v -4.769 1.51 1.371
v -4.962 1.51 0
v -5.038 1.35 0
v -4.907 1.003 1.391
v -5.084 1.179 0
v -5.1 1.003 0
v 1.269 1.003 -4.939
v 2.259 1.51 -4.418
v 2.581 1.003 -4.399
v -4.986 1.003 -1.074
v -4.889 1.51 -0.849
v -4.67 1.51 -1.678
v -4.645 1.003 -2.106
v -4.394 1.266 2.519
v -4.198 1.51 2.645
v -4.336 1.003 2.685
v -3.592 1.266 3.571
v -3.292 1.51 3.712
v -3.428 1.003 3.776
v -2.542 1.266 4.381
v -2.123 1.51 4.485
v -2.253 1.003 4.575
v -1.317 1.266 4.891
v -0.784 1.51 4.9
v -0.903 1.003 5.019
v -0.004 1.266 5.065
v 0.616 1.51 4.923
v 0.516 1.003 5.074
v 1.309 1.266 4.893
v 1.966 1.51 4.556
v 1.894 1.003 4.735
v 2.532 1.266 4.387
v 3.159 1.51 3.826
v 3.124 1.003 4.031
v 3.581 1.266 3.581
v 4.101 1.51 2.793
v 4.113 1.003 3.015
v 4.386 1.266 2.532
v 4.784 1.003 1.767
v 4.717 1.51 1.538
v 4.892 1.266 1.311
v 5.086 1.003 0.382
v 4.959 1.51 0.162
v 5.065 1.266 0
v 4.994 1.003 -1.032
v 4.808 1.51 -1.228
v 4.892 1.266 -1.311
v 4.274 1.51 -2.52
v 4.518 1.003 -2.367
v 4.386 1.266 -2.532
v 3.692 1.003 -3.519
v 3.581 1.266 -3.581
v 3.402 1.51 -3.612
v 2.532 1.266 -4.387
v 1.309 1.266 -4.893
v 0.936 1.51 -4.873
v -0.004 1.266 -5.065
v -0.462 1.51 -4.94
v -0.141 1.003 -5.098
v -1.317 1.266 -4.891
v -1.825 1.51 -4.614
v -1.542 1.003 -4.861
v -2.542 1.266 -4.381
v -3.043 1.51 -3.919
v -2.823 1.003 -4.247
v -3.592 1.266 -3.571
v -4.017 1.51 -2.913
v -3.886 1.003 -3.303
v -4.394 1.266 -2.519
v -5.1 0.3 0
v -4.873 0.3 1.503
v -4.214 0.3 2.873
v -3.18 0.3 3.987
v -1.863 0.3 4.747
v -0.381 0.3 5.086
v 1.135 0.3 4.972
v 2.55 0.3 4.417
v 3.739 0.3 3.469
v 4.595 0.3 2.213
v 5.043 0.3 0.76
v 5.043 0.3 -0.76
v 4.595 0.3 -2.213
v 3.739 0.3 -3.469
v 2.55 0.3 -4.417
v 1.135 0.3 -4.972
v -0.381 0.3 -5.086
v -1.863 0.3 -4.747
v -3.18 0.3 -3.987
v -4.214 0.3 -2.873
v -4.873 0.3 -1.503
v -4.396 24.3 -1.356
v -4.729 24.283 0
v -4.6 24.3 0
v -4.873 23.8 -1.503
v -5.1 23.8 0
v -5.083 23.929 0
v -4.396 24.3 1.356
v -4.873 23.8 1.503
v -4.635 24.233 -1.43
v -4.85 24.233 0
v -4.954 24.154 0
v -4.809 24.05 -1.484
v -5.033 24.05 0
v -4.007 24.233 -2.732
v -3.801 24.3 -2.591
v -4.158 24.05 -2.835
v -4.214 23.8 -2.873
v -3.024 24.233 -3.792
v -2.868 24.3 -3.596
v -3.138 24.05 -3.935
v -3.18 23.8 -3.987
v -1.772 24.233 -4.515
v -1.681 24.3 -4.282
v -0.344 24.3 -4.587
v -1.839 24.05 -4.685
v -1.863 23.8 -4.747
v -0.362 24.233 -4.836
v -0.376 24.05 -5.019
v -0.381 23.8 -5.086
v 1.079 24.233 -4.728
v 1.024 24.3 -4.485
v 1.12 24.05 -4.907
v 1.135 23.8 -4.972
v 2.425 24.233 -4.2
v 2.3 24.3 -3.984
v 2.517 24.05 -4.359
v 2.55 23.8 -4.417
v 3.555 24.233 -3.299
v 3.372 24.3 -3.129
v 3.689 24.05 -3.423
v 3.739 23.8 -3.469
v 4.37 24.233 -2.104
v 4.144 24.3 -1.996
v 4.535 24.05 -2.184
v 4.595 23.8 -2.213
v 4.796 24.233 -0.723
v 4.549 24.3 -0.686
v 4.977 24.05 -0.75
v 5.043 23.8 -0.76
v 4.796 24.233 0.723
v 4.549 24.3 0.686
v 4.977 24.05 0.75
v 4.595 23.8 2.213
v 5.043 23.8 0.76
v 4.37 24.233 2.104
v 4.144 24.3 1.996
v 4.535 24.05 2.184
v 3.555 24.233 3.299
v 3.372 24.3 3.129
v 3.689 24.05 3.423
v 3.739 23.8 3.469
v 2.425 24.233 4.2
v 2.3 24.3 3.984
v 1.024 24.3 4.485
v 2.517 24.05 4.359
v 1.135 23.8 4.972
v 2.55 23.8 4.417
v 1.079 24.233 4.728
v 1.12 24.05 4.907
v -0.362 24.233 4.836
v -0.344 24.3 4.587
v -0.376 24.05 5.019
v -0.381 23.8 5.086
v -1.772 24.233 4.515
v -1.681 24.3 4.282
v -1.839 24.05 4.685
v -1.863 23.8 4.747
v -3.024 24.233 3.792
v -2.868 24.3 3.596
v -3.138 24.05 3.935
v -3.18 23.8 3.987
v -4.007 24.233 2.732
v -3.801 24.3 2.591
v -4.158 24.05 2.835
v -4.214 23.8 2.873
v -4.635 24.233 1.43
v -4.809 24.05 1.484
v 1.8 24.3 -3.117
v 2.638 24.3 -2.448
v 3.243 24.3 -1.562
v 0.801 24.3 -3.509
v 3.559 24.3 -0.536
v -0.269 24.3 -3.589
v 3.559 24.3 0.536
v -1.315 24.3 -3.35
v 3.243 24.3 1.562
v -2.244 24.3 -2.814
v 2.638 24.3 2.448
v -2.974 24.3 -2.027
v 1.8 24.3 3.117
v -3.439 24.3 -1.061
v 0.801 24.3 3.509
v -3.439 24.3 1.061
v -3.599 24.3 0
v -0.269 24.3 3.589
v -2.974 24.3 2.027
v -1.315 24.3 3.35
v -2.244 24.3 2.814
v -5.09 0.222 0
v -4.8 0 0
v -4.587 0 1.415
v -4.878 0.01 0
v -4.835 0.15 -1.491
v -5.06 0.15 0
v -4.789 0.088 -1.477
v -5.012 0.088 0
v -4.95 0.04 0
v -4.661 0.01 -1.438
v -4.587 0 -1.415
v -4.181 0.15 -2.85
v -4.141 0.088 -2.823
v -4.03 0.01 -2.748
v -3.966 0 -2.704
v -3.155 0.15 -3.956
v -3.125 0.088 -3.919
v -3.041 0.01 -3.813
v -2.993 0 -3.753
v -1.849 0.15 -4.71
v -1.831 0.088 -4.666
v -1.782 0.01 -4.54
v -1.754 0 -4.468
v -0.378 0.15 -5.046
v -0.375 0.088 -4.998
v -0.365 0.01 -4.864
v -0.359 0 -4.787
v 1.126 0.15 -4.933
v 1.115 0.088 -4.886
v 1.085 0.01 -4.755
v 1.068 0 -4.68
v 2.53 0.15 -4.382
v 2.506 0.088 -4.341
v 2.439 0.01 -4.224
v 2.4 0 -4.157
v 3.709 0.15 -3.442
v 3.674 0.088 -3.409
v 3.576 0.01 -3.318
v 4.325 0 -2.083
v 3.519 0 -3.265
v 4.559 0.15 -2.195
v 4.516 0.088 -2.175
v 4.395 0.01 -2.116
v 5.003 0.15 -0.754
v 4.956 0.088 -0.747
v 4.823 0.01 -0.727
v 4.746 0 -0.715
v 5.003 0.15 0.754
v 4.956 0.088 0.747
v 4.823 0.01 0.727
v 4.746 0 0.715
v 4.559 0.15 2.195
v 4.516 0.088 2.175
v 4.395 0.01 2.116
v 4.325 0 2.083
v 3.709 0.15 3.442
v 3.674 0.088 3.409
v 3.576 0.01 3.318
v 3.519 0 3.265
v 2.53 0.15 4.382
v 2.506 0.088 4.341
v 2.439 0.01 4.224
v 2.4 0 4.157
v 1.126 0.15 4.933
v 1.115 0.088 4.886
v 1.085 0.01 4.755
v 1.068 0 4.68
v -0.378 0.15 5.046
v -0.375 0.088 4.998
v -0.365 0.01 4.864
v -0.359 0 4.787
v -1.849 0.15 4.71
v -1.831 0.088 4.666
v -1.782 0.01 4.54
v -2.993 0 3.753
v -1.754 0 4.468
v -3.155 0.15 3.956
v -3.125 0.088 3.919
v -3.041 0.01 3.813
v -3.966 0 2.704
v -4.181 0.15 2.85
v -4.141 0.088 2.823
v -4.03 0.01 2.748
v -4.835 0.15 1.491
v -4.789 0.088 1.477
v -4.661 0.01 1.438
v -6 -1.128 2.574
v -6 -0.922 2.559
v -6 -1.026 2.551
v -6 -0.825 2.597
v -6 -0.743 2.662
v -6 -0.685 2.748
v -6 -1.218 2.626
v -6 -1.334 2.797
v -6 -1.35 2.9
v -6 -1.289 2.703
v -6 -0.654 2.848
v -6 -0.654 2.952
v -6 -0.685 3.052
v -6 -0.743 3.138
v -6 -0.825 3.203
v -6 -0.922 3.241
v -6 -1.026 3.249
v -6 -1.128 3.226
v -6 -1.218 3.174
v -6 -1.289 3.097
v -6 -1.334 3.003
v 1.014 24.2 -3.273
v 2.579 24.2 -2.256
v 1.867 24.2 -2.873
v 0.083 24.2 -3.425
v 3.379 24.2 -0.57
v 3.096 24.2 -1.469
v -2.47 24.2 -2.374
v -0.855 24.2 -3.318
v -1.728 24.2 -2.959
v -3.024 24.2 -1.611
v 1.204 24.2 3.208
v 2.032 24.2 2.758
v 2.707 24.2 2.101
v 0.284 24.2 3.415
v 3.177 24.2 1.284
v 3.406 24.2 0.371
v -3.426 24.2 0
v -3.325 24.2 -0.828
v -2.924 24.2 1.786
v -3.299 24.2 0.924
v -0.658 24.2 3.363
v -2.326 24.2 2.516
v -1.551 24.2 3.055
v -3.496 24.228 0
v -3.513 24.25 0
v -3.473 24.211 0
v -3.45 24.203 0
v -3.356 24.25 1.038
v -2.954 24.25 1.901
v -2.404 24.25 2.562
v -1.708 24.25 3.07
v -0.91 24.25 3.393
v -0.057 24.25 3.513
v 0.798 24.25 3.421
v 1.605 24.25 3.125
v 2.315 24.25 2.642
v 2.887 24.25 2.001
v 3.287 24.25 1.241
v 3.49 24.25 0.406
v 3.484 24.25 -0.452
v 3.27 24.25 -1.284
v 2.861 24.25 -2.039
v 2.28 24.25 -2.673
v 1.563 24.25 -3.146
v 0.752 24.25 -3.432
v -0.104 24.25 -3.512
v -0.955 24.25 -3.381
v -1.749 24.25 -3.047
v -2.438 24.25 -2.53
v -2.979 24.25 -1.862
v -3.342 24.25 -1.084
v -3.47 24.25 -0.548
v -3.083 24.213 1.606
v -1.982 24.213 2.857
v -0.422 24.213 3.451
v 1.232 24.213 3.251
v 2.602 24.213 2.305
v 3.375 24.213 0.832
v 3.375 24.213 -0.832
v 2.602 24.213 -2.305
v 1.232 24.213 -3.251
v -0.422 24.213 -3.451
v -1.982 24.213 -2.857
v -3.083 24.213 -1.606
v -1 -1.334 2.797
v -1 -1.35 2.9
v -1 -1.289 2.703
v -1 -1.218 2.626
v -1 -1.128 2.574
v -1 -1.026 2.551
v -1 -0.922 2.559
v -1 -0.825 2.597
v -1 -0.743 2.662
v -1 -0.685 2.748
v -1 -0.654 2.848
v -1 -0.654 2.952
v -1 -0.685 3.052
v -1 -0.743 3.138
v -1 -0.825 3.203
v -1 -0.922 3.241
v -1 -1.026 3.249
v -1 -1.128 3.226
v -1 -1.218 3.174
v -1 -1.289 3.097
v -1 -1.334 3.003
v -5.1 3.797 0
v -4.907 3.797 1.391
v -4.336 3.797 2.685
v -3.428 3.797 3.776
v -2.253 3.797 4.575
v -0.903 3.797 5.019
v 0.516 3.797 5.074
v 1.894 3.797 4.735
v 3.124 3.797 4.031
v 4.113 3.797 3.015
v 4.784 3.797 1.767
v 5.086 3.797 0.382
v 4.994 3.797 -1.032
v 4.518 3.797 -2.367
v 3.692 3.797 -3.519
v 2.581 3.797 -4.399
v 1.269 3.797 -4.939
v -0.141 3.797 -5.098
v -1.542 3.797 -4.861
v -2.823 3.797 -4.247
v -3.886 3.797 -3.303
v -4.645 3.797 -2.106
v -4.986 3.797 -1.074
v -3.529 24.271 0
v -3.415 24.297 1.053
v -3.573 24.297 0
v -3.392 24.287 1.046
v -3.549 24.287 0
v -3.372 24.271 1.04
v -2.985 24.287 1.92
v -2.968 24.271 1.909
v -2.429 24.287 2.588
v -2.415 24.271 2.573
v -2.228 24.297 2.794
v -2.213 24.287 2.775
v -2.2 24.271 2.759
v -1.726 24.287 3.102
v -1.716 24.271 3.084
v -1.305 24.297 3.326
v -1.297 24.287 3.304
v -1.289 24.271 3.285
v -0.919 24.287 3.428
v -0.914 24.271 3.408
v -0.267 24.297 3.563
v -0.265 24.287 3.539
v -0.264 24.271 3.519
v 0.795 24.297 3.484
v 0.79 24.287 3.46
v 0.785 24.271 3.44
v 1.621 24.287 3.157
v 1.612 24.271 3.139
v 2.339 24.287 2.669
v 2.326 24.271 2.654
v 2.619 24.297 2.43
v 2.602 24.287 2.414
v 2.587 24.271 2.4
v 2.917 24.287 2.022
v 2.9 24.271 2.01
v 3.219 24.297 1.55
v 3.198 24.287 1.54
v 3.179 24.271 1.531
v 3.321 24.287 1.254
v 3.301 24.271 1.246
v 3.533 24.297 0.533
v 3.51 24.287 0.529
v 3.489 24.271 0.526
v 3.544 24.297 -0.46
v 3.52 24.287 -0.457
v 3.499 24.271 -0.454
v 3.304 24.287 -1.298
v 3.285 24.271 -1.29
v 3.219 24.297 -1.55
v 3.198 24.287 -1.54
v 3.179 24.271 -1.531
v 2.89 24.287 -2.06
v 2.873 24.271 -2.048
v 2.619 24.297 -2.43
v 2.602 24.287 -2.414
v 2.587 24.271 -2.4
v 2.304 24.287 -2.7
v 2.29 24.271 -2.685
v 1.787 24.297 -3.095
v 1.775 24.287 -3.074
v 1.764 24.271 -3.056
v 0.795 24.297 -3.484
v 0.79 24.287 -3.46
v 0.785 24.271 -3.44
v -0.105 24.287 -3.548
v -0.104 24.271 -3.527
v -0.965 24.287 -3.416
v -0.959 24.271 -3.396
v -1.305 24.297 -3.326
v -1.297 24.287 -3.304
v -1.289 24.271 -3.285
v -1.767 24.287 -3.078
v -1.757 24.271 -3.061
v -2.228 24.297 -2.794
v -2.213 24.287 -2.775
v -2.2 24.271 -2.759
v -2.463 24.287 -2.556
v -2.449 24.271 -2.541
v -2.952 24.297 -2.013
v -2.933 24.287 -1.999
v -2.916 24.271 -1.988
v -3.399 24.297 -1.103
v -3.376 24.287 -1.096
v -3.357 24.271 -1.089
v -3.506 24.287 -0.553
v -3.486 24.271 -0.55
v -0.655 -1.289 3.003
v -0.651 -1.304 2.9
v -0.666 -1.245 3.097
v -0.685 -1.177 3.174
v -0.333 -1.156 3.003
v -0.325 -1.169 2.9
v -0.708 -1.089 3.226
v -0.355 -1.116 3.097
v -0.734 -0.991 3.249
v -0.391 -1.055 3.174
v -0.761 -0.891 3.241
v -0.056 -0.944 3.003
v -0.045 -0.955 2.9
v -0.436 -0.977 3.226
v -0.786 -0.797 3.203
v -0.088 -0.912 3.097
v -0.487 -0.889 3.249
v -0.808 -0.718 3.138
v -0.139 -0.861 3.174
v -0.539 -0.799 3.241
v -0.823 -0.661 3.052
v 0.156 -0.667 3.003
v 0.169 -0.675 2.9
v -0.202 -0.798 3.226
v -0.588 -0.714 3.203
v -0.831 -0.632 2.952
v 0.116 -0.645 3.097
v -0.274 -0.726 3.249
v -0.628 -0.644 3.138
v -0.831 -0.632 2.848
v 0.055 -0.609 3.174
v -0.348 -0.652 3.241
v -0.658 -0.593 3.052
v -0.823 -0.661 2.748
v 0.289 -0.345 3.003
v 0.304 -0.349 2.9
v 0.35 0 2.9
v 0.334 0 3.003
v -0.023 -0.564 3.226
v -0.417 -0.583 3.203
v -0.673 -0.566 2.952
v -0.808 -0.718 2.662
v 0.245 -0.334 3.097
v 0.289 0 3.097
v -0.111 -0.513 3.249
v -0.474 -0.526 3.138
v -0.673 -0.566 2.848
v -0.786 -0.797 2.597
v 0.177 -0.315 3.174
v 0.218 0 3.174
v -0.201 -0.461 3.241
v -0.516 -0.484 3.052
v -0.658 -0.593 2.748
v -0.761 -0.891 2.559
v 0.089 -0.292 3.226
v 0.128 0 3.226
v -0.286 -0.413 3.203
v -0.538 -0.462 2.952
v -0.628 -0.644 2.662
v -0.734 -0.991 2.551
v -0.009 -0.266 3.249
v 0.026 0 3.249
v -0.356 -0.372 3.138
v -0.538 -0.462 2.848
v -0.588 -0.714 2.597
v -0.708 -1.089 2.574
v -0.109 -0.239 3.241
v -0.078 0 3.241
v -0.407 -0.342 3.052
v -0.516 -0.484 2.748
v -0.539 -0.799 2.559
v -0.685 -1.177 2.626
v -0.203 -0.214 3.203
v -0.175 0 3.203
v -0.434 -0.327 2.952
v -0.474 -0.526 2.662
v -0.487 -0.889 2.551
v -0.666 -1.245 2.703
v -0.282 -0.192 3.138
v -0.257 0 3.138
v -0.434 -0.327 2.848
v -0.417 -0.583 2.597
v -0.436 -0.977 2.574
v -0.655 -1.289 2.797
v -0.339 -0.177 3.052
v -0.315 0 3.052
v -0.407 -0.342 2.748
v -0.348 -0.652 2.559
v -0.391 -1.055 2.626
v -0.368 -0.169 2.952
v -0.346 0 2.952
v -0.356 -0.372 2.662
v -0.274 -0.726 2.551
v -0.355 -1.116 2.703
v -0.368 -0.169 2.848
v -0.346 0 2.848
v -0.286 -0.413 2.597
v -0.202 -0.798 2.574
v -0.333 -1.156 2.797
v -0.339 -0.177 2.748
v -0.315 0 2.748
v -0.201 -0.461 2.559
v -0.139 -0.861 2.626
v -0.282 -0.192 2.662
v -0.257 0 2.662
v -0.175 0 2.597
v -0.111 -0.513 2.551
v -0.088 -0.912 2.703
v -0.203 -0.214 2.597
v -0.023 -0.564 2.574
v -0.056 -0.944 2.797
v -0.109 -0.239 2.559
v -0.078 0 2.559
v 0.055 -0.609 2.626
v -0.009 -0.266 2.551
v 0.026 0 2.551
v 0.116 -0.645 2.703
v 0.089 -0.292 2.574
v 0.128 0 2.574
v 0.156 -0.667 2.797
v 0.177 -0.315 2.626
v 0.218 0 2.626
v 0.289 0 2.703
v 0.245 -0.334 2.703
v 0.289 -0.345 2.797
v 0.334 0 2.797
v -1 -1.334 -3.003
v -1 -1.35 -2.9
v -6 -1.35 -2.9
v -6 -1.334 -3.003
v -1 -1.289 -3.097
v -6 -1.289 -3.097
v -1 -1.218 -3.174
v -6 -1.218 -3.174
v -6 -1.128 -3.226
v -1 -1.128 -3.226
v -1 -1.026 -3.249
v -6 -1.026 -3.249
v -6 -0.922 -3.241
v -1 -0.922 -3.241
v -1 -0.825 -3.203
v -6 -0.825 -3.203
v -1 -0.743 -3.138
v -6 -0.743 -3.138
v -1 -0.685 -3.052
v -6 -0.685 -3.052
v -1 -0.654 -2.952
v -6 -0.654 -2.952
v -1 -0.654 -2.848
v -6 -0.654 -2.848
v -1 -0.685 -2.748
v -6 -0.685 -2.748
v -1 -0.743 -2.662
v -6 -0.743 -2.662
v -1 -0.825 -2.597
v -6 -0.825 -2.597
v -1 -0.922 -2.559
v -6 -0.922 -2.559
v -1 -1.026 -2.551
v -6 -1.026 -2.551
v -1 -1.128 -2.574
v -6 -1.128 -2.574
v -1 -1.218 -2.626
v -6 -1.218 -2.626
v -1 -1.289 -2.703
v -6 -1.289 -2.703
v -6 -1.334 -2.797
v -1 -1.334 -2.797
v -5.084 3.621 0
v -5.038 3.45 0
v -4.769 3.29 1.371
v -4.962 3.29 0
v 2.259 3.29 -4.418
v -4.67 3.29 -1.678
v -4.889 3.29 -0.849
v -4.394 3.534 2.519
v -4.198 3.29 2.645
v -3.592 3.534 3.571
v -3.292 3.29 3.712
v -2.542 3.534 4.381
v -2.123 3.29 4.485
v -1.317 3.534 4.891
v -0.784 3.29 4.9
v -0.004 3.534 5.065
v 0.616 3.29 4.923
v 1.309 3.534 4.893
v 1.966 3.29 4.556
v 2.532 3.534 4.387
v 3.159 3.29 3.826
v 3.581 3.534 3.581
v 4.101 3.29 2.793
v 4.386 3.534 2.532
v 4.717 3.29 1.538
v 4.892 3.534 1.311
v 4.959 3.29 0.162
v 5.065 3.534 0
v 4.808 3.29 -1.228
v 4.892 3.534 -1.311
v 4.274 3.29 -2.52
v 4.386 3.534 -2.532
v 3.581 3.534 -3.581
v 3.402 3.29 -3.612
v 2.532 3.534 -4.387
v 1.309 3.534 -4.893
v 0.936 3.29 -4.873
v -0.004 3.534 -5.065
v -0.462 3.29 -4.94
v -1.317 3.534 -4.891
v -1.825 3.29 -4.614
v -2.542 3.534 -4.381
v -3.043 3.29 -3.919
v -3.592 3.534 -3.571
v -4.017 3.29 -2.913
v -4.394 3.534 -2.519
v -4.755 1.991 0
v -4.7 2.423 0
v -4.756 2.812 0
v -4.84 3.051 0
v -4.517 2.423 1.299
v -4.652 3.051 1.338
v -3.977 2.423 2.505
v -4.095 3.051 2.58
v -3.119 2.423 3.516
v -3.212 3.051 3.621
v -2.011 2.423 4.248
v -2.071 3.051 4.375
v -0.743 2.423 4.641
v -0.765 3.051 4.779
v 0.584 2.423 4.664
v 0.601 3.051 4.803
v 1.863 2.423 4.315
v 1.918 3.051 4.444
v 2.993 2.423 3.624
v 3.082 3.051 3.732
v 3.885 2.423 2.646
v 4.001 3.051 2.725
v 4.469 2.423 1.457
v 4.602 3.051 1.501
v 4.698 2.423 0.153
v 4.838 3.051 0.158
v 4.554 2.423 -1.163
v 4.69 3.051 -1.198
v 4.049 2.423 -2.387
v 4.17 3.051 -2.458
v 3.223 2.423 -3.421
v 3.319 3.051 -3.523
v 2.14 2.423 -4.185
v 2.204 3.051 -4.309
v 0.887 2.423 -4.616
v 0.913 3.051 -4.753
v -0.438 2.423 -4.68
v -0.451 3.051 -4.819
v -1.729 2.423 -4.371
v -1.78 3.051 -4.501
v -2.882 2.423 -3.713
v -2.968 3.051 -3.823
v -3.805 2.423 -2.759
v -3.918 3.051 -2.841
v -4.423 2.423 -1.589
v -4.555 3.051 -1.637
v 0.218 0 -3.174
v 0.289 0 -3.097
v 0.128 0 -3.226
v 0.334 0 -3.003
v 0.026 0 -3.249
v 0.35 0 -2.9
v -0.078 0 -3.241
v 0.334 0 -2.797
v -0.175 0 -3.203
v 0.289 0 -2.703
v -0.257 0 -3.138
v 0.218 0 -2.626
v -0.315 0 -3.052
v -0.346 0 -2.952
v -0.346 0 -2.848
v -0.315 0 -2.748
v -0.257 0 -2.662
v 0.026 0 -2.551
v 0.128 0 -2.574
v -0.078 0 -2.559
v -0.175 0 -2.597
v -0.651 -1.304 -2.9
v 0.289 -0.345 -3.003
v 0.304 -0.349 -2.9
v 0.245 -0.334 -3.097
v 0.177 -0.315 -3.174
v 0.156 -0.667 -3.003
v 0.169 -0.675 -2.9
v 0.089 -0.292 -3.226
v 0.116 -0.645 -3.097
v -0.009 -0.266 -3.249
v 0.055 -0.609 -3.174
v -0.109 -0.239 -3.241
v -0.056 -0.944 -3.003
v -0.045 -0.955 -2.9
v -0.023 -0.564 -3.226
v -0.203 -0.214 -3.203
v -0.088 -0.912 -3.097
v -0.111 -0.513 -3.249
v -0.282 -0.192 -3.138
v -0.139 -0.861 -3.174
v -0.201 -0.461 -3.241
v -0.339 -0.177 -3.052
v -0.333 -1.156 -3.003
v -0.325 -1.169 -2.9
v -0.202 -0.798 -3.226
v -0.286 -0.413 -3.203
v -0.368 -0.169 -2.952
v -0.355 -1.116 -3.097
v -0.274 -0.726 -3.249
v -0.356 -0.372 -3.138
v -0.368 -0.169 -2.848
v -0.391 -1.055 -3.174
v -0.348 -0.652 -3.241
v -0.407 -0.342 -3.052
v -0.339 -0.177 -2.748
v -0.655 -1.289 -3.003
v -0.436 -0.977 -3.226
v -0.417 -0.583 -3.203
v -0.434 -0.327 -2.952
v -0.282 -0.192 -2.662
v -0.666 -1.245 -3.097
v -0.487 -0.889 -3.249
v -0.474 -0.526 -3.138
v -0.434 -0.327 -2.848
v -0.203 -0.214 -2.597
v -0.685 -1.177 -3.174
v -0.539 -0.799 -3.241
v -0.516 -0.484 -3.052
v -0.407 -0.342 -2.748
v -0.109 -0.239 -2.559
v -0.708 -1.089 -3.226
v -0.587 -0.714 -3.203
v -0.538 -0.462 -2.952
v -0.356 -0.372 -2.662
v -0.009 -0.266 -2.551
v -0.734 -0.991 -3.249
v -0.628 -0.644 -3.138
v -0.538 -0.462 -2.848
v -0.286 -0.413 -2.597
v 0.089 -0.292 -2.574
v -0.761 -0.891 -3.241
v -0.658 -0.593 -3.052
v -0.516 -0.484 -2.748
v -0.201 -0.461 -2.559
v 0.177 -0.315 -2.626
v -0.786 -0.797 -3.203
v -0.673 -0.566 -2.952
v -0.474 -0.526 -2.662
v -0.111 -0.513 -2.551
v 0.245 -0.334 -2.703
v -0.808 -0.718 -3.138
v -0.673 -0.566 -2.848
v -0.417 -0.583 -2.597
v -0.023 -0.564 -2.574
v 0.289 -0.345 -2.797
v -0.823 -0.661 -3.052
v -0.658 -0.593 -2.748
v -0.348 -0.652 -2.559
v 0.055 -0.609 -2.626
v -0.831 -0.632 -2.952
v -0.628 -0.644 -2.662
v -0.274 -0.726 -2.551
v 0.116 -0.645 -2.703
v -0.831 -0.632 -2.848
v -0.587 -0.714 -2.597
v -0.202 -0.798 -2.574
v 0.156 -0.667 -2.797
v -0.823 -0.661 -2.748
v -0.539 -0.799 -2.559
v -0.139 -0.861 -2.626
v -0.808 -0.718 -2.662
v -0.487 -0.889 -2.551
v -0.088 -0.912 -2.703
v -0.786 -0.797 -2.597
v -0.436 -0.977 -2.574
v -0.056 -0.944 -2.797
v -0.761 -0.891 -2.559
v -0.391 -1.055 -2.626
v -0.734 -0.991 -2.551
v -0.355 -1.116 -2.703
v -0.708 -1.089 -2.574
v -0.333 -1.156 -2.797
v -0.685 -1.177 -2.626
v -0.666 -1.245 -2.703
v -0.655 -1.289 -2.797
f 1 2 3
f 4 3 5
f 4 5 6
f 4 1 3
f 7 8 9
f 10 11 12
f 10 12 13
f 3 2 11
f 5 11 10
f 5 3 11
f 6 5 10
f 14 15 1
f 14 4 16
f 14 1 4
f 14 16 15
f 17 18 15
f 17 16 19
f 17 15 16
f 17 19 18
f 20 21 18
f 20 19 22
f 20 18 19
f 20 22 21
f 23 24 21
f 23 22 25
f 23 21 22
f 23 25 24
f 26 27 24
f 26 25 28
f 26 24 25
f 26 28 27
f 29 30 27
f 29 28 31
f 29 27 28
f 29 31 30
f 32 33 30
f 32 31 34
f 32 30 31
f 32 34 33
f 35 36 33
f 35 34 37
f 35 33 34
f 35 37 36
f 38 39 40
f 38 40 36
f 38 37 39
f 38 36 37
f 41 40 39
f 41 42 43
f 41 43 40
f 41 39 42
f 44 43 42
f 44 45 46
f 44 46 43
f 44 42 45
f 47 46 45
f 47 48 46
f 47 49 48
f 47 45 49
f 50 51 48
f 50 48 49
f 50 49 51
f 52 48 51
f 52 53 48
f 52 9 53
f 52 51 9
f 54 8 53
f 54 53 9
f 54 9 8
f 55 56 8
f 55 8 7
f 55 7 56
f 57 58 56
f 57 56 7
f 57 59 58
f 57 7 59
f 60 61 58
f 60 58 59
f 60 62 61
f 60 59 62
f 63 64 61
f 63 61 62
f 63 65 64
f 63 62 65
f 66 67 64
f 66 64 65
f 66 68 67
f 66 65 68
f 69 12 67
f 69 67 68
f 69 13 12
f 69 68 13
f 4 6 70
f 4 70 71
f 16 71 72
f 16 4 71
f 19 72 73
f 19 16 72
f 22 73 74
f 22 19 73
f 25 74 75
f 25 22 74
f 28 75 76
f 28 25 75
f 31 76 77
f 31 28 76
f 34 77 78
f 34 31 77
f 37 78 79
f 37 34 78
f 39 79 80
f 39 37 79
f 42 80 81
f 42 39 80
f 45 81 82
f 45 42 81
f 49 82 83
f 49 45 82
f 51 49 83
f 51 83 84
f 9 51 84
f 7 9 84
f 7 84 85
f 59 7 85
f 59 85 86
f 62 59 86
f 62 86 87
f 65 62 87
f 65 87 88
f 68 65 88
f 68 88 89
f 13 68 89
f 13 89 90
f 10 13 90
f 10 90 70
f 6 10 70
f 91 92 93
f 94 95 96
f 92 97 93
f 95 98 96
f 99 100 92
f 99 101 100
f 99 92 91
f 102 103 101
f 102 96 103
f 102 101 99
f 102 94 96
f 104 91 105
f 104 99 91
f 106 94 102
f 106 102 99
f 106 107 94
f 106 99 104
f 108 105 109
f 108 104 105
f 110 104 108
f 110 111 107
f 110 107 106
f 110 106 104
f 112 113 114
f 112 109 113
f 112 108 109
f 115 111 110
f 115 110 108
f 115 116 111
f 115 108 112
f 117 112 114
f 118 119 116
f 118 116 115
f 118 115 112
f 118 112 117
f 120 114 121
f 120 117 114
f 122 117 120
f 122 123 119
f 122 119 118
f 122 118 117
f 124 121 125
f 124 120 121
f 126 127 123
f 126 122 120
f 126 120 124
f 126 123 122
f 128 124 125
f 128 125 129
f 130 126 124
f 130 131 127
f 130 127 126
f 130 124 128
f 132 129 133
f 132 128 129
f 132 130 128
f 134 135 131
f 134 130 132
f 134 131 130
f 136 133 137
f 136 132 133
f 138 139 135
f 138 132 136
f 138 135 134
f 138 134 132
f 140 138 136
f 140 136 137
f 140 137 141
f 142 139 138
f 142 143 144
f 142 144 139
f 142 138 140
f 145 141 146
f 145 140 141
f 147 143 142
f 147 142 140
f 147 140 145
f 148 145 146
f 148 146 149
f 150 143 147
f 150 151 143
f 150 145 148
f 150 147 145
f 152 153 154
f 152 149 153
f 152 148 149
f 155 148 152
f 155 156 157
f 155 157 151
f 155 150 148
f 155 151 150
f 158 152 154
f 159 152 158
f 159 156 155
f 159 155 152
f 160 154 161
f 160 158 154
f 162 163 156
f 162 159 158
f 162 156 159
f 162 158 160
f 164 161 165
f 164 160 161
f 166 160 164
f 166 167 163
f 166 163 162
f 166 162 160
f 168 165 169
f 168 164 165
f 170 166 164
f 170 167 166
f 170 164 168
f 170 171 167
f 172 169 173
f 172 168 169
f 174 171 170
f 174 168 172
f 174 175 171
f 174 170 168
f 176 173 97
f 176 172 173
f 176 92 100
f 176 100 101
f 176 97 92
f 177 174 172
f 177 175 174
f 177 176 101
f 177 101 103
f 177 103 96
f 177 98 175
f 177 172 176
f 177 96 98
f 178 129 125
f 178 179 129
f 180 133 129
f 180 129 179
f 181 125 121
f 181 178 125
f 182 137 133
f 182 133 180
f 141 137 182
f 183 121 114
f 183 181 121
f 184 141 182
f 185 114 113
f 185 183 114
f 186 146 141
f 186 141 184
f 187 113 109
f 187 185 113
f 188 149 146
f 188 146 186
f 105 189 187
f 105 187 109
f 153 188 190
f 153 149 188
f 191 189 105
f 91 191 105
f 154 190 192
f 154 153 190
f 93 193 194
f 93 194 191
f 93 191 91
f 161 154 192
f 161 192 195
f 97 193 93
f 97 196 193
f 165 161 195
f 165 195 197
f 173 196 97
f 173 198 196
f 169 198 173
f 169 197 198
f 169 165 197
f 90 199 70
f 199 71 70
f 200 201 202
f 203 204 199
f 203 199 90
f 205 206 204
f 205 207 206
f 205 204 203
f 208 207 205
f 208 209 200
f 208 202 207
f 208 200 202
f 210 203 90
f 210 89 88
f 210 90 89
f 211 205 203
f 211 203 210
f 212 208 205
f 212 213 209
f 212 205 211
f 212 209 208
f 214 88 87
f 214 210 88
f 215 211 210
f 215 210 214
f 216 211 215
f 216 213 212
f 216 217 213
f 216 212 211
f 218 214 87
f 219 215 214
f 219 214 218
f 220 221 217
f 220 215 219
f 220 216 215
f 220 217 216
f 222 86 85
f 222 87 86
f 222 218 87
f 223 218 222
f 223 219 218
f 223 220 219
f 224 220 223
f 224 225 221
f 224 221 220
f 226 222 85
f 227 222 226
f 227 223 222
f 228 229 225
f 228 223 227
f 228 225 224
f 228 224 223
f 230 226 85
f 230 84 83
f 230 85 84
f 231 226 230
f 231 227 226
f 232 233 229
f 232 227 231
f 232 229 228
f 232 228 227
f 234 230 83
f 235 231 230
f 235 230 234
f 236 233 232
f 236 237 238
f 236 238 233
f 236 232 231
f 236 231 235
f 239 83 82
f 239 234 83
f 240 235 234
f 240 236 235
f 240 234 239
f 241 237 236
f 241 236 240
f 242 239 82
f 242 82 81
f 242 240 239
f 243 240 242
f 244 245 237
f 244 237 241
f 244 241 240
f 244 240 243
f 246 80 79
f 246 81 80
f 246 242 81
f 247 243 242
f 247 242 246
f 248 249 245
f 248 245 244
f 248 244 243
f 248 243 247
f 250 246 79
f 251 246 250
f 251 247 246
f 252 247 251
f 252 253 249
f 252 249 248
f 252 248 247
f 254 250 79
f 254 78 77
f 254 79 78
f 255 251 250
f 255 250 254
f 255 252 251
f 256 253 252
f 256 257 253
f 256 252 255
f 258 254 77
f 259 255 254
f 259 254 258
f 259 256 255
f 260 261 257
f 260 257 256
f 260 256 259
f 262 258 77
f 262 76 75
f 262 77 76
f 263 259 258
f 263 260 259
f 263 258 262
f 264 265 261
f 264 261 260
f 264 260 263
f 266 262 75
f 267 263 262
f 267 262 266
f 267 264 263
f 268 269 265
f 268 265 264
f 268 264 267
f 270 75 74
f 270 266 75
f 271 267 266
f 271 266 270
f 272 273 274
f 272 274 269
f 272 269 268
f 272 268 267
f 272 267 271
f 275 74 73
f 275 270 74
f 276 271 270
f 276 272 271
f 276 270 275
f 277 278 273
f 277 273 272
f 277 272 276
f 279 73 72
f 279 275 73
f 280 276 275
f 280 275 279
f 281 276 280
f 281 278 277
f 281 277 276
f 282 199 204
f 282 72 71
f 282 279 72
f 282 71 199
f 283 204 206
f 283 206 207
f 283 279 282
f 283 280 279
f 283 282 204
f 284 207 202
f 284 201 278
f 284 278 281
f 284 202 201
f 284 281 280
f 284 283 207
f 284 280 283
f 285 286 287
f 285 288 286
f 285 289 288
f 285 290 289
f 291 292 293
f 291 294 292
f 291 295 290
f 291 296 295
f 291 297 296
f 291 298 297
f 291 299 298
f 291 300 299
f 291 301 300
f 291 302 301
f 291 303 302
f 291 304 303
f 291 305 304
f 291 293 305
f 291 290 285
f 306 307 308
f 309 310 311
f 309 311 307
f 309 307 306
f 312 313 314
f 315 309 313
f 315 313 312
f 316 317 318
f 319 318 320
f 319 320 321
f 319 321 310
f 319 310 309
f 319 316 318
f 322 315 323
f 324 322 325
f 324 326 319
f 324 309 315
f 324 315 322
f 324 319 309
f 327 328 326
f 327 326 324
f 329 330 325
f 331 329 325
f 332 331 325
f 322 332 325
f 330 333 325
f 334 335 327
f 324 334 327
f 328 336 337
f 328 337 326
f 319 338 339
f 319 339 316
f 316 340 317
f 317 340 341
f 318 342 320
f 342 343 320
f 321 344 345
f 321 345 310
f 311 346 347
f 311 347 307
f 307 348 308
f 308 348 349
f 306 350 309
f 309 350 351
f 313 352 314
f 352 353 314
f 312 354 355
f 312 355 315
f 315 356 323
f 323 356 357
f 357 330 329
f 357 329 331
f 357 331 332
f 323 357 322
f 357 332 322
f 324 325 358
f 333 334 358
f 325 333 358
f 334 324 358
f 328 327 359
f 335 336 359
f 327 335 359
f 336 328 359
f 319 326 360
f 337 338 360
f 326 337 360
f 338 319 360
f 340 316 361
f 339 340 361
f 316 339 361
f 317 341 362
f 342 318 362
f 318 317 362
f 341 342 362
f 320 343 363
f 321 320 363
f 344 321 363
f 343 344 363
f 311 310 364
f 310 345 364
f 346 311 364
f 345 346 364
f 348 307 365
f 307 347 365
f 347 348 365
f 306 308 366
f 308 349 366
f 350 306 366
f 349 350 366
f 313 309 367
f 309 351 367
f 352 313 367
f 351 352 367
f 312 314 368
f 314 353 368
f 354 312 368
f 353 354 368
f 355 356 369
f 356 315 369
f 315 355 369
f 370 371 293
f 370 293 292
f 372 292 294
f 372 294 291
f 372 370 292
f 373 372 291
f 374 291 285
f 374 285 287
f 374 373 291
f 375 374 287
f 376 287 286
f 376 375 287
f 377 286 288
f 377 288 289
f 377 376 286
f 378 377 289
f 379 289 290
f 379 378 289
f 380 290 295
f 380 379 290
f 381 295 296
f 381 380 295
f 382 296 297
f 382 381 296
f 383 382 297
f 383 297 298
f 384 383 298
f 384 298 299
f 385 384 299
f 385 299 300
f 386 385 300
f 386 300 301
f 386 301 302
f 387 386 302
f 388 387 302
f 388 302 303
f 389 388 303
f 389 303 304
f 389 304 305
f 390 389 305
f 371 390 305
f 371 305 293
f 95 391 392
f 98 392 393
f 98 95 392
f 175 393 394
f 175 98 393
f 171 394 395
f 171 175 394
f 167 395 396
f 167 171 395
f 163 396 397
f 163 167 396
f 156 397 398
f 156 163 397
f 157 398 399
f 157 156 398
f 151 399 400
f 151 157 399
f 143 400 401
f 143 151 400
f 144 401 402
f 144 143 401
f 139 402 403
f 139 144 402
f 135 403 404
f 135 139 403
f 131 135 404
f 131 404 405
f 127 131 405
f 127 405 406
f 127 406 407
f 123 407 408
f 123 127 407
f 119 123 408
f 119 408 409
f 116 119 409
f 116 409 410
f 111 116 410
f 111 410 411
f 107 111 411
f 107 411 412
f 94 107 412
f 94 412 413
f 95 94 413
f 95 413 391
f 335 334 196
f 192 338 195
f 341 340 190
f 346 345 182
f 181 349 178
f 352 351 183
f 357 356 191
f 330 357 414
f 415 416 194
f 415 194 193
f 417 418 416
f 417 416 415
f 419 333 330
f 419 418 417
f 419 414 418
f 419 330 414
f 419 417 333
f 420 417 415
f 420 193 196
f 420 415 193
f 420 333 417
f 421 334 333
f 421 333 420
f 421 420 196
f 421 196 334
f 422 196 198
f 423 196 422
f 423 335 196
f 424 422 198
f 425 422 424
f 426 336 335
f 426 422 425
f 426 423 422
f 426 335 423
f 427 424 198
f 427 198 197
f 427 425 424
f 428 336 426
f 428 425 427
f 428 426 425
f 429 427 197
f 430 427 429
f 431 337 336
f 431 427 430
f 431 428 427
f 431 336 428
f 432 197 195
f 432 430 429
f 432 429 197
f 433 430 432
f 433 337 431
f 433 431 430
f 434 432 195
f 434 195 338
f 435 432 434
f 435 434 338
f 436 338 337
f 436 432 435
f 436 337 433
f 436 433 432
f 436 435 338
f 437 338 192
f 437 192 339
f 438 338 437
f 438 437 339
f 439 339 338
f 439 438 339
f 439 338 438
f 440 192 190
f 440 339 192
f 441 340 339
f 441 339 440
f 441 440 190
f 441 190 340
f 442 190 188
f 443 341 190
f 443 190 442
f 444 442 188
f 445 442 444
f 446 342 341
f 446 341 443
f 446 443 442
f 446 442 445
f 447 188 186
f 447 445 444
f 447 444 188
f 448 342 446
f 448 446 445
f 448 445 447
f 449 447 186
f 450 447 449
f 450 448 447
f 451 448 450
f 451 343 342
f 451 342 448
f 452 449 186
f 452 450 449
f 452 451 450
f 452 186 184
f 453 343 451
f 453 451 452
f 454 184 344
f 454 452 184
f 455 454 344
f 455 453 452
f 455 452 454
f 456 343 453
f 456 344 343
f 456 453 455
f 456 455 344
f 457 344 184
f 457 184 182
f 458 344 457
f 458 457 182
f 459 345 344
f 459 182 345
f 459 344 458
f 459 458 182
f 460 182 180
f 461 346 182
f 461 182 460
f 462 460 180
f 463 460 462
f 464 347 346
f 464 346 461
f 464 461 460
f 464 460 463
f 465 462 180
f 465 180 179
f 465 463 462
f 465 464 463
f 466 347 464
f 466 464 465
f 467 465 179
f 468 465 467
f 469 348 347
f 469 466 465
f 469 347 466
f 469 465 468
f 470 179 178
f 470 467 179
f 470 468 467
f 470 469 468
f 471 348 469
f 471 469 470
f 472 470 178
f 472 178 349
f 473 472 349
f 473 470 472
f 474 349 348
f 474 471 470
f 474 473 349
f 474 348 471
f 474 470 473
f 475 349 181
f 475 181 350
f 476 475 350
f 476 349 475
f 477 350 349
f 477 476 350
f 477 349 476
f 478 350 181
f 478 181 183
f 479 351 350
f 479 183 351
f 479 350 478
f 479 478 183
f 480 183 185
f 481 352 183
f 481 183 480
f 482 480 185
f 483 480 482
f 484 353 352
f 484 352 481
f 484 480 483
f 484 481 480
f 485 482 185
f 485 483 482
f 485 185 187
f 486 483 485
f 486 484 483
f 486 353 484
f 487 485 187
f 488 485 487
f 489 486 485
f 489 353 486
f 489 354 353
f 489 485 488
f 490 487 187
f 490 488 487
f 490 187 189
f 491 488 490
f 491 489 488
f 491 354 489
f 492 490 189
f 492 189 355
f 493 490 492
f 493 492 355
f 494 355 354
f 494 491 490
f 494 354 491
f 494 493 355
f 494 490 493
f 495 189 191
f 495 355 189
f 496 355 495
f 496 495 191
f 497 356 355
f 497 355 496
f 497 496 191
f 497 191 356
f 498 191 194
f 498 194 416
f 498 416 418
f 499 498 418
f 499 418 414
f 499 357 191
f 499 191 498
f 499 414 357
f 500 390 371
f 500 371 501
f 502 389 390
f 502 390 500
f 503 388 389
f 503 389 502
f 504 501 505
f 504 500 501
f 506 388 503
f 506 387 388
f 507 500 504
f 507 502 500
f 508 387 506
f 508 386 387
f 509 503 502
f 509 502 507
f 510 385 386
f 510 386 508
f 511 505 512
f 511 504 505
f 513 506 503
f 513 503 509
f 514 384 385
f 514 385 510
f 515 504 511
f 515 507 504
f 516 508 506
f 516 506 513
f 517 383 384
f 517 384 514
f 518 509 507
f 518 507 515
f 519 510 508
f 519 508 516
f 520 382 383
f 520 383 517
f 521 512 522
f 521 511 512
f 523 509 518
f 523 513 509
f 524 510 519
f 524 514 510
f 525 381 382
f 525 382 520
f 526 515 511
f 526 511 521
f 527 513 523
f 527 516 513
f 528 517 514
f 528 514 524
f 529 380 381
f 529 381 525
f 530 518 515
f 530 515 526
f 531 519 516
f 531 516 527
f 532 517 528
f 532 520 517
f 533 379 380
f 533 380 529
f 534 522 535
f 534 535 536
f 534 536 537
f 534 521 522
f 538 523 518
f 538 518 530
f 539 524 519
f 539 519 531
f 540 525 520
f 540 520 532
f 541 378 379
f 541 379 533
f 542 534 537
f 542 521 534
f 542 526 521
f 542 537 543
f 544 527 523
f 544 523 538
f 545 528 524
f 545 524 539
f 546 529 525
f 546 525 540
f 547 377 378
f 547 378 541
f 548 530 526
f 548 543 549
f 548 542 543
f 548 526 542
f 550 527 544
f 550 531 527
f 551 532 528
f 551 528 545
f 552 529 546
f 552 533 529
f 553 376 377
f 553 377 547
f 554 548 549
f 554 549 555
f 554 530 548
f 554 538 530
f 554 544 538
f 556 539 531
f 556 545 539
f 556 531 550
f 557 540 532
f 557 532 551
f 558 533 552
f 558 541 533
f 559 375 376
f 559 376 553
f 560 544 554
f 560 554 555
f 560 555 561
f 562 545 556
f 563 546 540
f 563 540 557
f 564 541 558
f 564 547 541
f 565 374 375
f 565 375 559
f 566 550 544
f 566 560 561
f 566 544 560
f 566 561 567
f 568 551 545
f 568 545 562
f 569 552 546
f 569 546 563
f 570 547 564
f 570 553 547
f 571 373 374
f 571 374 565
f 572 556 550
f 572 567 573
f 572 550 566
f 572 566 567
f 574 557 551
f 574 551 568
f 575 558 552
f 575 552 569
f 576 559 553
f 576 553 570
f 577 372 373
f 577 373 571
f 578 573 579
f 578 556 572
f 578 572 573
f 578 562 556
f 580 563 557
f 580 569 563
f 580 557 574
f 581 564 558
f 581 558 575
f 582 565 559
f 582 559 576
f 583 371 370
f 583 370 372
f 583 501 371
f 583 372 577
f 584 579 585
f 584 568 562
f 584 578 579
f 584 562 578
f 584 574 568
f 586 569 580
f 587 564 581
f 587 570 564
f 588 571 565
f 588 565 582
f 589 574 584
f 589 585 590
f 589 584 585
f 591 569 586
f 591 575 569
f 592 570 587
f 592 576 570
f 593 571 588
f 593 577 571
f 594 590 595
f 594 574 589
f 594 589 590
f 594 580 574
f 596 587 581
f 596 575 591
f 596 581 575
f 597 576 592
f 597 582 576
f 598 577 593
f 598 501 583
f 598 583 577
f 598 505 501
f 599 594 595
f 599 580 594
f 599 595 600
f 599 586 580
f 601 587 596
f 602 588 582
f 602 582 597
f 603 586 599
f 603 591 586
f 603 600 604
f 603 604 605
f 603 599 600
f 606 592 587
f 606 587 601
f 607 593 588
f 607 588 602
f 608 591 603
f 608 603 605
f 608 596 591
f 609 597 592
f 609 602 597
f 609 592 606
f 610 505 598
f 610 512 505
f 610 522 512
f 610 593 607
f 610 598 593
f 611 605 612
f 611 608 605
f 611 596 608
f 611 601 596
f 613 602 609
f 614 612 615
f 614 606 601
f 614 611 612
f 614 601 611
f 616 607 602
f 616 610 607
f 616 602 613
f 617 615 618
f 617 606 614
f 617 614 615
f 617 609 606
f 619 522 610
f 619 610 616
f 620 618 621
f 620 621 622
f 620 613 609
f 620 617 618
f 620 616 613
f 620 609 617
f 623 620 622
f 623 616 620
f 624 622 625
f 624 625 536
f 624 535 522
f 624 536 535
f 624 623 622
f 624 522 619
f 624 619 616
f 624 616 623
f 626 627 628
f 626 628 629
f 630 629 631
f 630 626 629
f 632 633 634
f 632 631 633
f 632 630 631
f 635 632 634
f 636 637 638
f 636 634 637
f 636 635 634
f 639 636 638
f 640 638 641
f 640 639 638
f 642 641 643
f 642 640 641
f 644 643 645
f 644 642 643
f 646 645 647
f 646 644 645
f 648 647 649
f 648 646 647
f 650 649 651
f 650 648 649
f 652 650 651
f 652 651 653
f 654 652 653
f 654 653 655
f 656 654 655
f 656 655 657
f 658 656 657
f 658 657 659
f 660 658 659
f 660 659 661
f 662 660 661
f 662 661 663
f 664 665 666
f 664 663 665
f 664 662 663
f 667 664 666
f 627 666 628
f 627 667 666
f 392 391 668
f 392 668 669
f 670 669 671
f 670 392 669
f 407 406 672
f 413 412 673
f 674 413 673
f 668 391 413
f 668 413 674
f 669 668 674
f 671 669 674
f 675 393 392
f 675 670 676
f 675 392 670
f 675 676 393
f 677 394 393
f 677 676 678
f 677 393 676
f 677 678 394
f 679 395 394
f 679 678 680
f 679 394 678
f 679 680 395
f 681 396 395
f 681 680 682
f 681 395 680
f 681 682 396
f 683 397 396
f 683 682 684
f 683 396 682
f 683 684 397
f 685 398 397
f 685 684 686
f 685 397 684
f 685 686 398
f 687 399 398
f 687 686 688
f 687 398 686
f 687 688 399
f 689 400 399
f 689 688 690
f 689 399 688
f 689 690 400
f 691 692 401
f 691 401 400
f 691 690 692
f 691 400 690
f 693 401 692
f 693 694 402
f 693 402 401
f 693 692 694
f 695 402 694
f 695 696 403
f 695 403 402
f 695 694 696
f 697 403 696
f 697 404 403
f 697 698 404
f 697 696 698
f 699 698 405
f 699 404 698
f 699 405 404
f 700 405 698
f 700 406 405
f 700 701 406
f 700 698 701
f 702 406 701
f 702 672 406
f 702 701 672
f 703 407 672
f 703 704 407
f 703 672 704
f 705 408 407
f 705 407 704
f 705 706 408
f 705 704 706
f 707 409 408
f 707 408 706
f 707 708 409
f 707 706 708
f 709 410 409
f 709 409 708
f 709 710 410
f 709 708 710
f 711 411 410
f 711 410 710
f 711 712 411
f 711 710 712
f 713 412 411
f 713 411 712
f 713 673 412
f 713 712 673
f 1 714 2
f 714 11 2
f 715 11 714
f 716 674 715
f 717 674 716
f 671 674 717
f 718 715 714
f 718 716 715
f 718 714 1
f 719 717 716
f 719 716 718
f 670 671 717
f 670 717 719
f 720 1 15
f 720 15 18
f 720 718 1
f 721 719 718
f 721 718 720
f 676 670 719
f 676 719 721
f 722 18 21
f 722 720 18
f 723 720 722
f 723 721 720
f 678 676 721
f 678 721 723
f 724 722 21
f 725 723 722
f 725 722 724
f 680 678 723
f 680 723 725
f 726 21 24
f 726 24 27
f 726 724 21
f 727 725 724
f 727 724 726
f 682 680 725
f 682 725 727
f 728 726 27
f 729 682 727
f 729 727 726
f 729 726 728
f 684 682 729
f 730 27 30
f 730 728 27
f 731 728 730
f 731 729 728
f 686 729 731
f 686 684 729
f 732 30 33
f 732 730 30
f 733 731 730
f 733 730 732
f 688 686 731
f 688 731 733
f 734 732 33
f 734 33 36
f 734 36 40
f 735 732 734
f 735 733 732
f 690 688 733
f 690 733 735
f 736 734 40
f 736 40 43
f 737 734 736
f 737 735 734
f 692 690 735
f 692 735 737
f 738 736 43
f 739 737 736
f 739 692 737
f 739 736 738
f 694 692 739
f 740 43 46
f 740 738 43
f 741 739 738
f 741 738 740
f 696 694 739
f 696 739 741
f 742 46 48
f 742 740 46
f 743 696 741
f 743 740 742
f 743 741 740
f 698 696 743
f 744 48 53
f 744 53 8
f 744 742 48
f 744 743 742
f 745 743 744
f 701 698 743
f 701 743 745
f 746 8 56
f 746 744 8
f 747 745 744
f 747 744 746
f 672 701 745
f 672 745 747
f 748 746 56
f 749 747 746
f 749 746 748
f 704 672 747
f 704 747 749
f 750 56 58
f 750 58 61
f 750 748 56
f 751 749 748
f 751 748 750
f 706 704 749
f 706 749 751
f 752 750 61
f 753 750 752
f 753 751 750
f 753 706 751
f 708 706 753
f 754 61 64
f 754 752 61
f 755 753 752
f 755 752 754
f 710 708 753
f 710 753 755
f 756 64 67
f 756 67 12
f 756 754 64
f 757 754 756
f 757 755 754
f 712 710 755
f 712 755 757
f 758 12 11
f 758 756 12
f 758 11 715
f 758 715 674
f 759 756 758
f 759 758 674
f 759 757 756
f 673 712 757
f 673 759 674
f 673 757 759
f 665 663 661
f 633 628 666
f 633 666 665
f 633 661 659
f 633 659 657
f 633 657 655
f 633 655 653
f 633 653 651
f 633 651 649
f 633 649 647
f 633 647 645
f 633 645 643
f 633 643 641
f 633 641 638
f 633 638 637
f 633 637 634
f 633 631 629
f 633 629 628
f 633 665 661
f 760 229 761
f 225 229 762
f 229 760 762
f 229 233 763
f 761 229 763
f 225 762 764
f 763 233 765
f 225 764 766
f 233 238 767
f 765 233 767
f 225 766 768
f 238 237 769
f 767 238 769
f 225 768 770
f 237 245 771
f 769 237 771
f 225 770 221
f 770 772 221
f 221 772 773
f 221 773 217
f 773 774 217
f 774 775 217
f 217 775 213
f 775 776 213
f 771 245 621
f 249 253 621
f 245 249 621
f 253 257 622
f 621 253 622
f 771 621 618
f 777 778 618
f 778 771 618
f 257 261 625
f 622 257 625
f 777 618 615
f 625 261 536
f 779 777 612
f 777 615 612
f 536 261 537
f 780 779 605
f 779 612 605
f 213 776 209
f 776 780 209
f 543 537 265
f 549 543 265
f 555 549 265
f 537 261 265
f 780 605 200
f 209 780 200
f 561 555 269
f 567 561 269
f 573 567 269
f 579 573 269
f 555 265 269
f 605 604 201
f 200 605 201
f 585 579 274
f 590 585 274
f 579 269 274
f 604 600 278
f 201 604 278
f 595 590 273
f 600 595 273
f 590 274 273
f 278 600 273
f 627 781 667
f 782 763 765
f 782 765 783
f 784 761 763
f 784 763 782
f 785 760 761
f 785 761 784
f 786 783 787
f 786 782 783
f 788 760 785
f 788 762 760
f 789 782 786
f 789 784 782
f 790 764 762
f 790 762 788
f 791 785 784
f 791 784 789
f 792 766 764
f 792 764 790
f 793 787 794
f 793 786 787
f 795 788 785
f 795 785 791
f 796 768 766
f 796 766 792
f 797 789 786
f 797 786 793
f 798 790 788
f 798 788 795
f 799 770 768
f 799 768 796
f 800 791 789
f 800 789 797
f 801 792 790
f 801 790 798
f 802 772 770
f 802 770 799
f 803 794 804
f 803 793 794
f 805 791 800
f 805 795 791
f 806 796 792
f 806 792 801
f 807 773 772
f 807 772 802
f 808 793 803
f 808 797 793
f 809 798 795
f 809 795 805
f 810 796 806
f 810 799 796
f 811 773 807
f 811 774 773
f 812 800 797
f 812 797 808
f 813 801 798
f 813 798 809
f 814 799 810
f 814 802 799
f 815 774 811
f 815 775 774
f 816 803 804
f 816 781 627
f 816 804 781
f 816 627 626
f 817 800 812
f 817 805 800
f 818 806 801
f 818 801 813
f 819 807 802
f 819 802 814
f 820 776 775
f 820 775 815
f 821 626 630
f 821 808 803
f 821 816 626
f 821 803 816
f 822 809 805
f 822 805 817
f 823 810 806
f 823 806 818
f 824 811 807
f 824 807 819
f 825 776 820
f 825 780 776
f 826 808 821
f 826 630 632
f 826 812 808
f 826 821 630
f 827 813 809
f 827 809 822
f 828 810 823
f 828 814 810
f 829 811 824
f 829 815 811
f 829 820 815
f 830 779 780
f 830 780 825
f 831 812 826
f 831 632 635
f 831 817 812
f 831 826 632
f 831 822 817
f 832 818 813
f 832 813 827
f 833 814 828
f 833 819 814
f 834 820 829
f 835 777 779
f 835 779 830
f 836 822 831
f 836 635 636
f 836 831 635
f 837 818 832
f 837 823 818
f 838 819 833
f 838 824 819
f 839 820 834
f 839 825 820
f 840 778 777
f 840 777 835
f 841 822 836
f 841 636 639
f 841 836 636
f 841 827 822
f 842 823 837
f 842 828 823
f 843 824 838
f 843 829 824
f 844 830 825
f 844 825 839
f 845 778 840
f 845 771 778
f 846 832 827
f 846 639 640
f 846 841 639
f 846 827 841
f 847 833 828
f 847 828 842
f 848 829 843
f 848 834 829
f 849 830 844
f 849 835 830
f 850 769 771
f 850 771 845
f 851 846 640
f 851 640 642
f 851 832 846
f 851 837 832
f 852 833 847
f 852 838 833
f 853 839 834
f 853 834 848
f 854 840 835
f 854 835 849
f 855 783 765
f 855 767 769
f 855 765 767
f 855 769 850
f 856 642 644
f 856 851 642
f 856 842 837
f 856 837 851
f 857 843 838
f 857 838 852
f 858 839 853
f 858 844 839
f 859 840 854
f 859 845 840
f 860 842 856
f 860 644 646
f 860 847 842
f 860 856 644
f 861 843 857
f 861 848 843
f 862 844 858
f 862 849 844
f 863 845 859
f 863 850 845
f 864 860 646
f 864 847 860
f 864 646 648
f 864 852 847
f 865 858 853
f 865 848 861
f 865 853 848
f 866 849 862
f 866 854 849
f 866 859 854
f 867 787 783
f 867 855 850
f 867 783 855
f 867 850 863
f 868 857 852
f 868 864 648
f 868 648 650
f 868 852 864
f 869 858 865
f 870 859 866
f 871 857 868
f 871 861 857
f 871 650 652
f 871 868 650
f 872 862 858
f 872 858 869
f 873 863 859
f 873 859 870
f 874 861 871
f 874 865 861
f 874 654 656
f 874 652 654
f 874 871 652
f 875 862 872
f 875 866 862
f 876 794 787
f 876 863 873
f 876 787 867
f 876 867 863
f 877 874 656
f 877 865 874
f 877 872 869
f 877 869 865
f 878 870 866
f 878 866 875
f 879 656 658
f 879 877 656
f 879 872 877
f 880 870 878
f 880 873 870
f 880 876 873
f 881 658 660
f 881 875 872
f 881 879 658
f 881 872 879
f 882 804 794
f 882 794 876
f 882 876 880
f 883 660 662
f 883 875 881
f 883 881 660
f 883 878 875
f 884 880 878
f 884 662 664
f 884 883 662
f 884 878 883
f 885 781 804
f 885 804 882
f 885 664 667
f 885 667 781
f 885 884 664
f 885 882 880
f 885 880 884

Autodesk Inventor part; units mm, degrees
ref_plane "YZ Plane" through (0, 0, 0) normal (1, 0, 0) x (0, 1, 0)
ref_plane "XZ Plane" through (0, 0, 0) normal (0, 1, 0) x (-1, 0, 0)
sketch "Sketch1" plane through (0, 0, 0) normal (0, 0, 1) x (1, 0, 0)
  line L0 (0, 0) -> (-5.1, 0)
  line L1 (-5.1, 24.3) -> (-3.5, 24.3)
  line L2 (0, 24.2) -> (0, 0)
  line L3 (0, 0) -> (0, 14.6949)
  line L4 (-3.5, 24.3) -> (-3.5, 24.2)
  line L5 (-3.5, 24.2) -> (0, 24.2)
  spline S0 degree 2 poles (-5.1, 1.3) (-4.3, 2.4) (-5.1, 3.5) knots 0 0 0 1 1 1
  line L6 (-5.1, 0) -> (-5.1, 1.3)
  line L7 (-5.1, 3.5) -> (-5.1, 24.3)
  point P0 (-4.7, 2.4)
  dimension "d1" = 24.3
  dimension "d2" = 3.5
  dimension "d3" = 0.1
  dimension "d4" = 1.3
  dimension "d5" = 3.5
  dimension "d7" = 1.1
revolve "Revolution1" add sketch "Sketch1" angle 360 about axis through (0, 0, 0) along (0, 1, 0)
fillet "Fillet1" radius 0.1 2 edges at (3.5, 24.3, 0) (3.5, 24.2, 0)
fillet "Fillet2" radius 0.5 1 edges at (5.1, 24.3, 0)
fillet "Fillet3" radius 1 2 edges at (5.1, 3.5, 0) (5.1, 1.3, 0)
fillet "Fillet4" radius 0.3 1 edges at (5.1, 0, 0)
sketch "Sketch2" plane through (0, 0, 0) normal (0, -1, 0) x (1, 0, 0)
  circle A0 centre (0, 2.9) radius 0.35
  circle A1 centre (0, -2.9) radius 0.35
  circle A2 centre (0, 0) radius 4.8 projected
  line L0 (-4.8, 0) -> (4.8, 0) construction
  line L1 (0, 4.8) -> (0, -4.8) construction
  dimension "d13" = 5.8
  dimension "d14" = 0.7
ref_plane "Work Plane1" through (0, 0, 2.9) normal (0, 0, 1) x (1, 0, 0)
sketch "Sketch3" plane through (0, 0, 2.9) normal (0, 0, 1) x (1, 0, 0)
  line L0 (-0.35, 0) -> (0.35, 0) projected
  line L1 (4.8, 0) -> (-4.8, 0) projected
  arc A0 (-1, -1) -> (0, 0) centre (-1, 0) ccw
  line L2 (-1, 0) -> (-1, -1) construction
  line L3 (-1, 0) -> (0, 0) construction
  line L4 (-1, -1) -> (-6, -1)
  point P0 (0, 0)
  dimension "d15" = 90
  dimension "d16" = 1
  dimension "d17" = 5
sweep "Sweep1" add profiles "Sketch2" path "Sketch3" path curves A0 L4 contours A0
mirror "Mirror1" about plane through (0, 0, 0) normal (0, 0, 1) of "Sweep1"
properties part number "capacitor"
